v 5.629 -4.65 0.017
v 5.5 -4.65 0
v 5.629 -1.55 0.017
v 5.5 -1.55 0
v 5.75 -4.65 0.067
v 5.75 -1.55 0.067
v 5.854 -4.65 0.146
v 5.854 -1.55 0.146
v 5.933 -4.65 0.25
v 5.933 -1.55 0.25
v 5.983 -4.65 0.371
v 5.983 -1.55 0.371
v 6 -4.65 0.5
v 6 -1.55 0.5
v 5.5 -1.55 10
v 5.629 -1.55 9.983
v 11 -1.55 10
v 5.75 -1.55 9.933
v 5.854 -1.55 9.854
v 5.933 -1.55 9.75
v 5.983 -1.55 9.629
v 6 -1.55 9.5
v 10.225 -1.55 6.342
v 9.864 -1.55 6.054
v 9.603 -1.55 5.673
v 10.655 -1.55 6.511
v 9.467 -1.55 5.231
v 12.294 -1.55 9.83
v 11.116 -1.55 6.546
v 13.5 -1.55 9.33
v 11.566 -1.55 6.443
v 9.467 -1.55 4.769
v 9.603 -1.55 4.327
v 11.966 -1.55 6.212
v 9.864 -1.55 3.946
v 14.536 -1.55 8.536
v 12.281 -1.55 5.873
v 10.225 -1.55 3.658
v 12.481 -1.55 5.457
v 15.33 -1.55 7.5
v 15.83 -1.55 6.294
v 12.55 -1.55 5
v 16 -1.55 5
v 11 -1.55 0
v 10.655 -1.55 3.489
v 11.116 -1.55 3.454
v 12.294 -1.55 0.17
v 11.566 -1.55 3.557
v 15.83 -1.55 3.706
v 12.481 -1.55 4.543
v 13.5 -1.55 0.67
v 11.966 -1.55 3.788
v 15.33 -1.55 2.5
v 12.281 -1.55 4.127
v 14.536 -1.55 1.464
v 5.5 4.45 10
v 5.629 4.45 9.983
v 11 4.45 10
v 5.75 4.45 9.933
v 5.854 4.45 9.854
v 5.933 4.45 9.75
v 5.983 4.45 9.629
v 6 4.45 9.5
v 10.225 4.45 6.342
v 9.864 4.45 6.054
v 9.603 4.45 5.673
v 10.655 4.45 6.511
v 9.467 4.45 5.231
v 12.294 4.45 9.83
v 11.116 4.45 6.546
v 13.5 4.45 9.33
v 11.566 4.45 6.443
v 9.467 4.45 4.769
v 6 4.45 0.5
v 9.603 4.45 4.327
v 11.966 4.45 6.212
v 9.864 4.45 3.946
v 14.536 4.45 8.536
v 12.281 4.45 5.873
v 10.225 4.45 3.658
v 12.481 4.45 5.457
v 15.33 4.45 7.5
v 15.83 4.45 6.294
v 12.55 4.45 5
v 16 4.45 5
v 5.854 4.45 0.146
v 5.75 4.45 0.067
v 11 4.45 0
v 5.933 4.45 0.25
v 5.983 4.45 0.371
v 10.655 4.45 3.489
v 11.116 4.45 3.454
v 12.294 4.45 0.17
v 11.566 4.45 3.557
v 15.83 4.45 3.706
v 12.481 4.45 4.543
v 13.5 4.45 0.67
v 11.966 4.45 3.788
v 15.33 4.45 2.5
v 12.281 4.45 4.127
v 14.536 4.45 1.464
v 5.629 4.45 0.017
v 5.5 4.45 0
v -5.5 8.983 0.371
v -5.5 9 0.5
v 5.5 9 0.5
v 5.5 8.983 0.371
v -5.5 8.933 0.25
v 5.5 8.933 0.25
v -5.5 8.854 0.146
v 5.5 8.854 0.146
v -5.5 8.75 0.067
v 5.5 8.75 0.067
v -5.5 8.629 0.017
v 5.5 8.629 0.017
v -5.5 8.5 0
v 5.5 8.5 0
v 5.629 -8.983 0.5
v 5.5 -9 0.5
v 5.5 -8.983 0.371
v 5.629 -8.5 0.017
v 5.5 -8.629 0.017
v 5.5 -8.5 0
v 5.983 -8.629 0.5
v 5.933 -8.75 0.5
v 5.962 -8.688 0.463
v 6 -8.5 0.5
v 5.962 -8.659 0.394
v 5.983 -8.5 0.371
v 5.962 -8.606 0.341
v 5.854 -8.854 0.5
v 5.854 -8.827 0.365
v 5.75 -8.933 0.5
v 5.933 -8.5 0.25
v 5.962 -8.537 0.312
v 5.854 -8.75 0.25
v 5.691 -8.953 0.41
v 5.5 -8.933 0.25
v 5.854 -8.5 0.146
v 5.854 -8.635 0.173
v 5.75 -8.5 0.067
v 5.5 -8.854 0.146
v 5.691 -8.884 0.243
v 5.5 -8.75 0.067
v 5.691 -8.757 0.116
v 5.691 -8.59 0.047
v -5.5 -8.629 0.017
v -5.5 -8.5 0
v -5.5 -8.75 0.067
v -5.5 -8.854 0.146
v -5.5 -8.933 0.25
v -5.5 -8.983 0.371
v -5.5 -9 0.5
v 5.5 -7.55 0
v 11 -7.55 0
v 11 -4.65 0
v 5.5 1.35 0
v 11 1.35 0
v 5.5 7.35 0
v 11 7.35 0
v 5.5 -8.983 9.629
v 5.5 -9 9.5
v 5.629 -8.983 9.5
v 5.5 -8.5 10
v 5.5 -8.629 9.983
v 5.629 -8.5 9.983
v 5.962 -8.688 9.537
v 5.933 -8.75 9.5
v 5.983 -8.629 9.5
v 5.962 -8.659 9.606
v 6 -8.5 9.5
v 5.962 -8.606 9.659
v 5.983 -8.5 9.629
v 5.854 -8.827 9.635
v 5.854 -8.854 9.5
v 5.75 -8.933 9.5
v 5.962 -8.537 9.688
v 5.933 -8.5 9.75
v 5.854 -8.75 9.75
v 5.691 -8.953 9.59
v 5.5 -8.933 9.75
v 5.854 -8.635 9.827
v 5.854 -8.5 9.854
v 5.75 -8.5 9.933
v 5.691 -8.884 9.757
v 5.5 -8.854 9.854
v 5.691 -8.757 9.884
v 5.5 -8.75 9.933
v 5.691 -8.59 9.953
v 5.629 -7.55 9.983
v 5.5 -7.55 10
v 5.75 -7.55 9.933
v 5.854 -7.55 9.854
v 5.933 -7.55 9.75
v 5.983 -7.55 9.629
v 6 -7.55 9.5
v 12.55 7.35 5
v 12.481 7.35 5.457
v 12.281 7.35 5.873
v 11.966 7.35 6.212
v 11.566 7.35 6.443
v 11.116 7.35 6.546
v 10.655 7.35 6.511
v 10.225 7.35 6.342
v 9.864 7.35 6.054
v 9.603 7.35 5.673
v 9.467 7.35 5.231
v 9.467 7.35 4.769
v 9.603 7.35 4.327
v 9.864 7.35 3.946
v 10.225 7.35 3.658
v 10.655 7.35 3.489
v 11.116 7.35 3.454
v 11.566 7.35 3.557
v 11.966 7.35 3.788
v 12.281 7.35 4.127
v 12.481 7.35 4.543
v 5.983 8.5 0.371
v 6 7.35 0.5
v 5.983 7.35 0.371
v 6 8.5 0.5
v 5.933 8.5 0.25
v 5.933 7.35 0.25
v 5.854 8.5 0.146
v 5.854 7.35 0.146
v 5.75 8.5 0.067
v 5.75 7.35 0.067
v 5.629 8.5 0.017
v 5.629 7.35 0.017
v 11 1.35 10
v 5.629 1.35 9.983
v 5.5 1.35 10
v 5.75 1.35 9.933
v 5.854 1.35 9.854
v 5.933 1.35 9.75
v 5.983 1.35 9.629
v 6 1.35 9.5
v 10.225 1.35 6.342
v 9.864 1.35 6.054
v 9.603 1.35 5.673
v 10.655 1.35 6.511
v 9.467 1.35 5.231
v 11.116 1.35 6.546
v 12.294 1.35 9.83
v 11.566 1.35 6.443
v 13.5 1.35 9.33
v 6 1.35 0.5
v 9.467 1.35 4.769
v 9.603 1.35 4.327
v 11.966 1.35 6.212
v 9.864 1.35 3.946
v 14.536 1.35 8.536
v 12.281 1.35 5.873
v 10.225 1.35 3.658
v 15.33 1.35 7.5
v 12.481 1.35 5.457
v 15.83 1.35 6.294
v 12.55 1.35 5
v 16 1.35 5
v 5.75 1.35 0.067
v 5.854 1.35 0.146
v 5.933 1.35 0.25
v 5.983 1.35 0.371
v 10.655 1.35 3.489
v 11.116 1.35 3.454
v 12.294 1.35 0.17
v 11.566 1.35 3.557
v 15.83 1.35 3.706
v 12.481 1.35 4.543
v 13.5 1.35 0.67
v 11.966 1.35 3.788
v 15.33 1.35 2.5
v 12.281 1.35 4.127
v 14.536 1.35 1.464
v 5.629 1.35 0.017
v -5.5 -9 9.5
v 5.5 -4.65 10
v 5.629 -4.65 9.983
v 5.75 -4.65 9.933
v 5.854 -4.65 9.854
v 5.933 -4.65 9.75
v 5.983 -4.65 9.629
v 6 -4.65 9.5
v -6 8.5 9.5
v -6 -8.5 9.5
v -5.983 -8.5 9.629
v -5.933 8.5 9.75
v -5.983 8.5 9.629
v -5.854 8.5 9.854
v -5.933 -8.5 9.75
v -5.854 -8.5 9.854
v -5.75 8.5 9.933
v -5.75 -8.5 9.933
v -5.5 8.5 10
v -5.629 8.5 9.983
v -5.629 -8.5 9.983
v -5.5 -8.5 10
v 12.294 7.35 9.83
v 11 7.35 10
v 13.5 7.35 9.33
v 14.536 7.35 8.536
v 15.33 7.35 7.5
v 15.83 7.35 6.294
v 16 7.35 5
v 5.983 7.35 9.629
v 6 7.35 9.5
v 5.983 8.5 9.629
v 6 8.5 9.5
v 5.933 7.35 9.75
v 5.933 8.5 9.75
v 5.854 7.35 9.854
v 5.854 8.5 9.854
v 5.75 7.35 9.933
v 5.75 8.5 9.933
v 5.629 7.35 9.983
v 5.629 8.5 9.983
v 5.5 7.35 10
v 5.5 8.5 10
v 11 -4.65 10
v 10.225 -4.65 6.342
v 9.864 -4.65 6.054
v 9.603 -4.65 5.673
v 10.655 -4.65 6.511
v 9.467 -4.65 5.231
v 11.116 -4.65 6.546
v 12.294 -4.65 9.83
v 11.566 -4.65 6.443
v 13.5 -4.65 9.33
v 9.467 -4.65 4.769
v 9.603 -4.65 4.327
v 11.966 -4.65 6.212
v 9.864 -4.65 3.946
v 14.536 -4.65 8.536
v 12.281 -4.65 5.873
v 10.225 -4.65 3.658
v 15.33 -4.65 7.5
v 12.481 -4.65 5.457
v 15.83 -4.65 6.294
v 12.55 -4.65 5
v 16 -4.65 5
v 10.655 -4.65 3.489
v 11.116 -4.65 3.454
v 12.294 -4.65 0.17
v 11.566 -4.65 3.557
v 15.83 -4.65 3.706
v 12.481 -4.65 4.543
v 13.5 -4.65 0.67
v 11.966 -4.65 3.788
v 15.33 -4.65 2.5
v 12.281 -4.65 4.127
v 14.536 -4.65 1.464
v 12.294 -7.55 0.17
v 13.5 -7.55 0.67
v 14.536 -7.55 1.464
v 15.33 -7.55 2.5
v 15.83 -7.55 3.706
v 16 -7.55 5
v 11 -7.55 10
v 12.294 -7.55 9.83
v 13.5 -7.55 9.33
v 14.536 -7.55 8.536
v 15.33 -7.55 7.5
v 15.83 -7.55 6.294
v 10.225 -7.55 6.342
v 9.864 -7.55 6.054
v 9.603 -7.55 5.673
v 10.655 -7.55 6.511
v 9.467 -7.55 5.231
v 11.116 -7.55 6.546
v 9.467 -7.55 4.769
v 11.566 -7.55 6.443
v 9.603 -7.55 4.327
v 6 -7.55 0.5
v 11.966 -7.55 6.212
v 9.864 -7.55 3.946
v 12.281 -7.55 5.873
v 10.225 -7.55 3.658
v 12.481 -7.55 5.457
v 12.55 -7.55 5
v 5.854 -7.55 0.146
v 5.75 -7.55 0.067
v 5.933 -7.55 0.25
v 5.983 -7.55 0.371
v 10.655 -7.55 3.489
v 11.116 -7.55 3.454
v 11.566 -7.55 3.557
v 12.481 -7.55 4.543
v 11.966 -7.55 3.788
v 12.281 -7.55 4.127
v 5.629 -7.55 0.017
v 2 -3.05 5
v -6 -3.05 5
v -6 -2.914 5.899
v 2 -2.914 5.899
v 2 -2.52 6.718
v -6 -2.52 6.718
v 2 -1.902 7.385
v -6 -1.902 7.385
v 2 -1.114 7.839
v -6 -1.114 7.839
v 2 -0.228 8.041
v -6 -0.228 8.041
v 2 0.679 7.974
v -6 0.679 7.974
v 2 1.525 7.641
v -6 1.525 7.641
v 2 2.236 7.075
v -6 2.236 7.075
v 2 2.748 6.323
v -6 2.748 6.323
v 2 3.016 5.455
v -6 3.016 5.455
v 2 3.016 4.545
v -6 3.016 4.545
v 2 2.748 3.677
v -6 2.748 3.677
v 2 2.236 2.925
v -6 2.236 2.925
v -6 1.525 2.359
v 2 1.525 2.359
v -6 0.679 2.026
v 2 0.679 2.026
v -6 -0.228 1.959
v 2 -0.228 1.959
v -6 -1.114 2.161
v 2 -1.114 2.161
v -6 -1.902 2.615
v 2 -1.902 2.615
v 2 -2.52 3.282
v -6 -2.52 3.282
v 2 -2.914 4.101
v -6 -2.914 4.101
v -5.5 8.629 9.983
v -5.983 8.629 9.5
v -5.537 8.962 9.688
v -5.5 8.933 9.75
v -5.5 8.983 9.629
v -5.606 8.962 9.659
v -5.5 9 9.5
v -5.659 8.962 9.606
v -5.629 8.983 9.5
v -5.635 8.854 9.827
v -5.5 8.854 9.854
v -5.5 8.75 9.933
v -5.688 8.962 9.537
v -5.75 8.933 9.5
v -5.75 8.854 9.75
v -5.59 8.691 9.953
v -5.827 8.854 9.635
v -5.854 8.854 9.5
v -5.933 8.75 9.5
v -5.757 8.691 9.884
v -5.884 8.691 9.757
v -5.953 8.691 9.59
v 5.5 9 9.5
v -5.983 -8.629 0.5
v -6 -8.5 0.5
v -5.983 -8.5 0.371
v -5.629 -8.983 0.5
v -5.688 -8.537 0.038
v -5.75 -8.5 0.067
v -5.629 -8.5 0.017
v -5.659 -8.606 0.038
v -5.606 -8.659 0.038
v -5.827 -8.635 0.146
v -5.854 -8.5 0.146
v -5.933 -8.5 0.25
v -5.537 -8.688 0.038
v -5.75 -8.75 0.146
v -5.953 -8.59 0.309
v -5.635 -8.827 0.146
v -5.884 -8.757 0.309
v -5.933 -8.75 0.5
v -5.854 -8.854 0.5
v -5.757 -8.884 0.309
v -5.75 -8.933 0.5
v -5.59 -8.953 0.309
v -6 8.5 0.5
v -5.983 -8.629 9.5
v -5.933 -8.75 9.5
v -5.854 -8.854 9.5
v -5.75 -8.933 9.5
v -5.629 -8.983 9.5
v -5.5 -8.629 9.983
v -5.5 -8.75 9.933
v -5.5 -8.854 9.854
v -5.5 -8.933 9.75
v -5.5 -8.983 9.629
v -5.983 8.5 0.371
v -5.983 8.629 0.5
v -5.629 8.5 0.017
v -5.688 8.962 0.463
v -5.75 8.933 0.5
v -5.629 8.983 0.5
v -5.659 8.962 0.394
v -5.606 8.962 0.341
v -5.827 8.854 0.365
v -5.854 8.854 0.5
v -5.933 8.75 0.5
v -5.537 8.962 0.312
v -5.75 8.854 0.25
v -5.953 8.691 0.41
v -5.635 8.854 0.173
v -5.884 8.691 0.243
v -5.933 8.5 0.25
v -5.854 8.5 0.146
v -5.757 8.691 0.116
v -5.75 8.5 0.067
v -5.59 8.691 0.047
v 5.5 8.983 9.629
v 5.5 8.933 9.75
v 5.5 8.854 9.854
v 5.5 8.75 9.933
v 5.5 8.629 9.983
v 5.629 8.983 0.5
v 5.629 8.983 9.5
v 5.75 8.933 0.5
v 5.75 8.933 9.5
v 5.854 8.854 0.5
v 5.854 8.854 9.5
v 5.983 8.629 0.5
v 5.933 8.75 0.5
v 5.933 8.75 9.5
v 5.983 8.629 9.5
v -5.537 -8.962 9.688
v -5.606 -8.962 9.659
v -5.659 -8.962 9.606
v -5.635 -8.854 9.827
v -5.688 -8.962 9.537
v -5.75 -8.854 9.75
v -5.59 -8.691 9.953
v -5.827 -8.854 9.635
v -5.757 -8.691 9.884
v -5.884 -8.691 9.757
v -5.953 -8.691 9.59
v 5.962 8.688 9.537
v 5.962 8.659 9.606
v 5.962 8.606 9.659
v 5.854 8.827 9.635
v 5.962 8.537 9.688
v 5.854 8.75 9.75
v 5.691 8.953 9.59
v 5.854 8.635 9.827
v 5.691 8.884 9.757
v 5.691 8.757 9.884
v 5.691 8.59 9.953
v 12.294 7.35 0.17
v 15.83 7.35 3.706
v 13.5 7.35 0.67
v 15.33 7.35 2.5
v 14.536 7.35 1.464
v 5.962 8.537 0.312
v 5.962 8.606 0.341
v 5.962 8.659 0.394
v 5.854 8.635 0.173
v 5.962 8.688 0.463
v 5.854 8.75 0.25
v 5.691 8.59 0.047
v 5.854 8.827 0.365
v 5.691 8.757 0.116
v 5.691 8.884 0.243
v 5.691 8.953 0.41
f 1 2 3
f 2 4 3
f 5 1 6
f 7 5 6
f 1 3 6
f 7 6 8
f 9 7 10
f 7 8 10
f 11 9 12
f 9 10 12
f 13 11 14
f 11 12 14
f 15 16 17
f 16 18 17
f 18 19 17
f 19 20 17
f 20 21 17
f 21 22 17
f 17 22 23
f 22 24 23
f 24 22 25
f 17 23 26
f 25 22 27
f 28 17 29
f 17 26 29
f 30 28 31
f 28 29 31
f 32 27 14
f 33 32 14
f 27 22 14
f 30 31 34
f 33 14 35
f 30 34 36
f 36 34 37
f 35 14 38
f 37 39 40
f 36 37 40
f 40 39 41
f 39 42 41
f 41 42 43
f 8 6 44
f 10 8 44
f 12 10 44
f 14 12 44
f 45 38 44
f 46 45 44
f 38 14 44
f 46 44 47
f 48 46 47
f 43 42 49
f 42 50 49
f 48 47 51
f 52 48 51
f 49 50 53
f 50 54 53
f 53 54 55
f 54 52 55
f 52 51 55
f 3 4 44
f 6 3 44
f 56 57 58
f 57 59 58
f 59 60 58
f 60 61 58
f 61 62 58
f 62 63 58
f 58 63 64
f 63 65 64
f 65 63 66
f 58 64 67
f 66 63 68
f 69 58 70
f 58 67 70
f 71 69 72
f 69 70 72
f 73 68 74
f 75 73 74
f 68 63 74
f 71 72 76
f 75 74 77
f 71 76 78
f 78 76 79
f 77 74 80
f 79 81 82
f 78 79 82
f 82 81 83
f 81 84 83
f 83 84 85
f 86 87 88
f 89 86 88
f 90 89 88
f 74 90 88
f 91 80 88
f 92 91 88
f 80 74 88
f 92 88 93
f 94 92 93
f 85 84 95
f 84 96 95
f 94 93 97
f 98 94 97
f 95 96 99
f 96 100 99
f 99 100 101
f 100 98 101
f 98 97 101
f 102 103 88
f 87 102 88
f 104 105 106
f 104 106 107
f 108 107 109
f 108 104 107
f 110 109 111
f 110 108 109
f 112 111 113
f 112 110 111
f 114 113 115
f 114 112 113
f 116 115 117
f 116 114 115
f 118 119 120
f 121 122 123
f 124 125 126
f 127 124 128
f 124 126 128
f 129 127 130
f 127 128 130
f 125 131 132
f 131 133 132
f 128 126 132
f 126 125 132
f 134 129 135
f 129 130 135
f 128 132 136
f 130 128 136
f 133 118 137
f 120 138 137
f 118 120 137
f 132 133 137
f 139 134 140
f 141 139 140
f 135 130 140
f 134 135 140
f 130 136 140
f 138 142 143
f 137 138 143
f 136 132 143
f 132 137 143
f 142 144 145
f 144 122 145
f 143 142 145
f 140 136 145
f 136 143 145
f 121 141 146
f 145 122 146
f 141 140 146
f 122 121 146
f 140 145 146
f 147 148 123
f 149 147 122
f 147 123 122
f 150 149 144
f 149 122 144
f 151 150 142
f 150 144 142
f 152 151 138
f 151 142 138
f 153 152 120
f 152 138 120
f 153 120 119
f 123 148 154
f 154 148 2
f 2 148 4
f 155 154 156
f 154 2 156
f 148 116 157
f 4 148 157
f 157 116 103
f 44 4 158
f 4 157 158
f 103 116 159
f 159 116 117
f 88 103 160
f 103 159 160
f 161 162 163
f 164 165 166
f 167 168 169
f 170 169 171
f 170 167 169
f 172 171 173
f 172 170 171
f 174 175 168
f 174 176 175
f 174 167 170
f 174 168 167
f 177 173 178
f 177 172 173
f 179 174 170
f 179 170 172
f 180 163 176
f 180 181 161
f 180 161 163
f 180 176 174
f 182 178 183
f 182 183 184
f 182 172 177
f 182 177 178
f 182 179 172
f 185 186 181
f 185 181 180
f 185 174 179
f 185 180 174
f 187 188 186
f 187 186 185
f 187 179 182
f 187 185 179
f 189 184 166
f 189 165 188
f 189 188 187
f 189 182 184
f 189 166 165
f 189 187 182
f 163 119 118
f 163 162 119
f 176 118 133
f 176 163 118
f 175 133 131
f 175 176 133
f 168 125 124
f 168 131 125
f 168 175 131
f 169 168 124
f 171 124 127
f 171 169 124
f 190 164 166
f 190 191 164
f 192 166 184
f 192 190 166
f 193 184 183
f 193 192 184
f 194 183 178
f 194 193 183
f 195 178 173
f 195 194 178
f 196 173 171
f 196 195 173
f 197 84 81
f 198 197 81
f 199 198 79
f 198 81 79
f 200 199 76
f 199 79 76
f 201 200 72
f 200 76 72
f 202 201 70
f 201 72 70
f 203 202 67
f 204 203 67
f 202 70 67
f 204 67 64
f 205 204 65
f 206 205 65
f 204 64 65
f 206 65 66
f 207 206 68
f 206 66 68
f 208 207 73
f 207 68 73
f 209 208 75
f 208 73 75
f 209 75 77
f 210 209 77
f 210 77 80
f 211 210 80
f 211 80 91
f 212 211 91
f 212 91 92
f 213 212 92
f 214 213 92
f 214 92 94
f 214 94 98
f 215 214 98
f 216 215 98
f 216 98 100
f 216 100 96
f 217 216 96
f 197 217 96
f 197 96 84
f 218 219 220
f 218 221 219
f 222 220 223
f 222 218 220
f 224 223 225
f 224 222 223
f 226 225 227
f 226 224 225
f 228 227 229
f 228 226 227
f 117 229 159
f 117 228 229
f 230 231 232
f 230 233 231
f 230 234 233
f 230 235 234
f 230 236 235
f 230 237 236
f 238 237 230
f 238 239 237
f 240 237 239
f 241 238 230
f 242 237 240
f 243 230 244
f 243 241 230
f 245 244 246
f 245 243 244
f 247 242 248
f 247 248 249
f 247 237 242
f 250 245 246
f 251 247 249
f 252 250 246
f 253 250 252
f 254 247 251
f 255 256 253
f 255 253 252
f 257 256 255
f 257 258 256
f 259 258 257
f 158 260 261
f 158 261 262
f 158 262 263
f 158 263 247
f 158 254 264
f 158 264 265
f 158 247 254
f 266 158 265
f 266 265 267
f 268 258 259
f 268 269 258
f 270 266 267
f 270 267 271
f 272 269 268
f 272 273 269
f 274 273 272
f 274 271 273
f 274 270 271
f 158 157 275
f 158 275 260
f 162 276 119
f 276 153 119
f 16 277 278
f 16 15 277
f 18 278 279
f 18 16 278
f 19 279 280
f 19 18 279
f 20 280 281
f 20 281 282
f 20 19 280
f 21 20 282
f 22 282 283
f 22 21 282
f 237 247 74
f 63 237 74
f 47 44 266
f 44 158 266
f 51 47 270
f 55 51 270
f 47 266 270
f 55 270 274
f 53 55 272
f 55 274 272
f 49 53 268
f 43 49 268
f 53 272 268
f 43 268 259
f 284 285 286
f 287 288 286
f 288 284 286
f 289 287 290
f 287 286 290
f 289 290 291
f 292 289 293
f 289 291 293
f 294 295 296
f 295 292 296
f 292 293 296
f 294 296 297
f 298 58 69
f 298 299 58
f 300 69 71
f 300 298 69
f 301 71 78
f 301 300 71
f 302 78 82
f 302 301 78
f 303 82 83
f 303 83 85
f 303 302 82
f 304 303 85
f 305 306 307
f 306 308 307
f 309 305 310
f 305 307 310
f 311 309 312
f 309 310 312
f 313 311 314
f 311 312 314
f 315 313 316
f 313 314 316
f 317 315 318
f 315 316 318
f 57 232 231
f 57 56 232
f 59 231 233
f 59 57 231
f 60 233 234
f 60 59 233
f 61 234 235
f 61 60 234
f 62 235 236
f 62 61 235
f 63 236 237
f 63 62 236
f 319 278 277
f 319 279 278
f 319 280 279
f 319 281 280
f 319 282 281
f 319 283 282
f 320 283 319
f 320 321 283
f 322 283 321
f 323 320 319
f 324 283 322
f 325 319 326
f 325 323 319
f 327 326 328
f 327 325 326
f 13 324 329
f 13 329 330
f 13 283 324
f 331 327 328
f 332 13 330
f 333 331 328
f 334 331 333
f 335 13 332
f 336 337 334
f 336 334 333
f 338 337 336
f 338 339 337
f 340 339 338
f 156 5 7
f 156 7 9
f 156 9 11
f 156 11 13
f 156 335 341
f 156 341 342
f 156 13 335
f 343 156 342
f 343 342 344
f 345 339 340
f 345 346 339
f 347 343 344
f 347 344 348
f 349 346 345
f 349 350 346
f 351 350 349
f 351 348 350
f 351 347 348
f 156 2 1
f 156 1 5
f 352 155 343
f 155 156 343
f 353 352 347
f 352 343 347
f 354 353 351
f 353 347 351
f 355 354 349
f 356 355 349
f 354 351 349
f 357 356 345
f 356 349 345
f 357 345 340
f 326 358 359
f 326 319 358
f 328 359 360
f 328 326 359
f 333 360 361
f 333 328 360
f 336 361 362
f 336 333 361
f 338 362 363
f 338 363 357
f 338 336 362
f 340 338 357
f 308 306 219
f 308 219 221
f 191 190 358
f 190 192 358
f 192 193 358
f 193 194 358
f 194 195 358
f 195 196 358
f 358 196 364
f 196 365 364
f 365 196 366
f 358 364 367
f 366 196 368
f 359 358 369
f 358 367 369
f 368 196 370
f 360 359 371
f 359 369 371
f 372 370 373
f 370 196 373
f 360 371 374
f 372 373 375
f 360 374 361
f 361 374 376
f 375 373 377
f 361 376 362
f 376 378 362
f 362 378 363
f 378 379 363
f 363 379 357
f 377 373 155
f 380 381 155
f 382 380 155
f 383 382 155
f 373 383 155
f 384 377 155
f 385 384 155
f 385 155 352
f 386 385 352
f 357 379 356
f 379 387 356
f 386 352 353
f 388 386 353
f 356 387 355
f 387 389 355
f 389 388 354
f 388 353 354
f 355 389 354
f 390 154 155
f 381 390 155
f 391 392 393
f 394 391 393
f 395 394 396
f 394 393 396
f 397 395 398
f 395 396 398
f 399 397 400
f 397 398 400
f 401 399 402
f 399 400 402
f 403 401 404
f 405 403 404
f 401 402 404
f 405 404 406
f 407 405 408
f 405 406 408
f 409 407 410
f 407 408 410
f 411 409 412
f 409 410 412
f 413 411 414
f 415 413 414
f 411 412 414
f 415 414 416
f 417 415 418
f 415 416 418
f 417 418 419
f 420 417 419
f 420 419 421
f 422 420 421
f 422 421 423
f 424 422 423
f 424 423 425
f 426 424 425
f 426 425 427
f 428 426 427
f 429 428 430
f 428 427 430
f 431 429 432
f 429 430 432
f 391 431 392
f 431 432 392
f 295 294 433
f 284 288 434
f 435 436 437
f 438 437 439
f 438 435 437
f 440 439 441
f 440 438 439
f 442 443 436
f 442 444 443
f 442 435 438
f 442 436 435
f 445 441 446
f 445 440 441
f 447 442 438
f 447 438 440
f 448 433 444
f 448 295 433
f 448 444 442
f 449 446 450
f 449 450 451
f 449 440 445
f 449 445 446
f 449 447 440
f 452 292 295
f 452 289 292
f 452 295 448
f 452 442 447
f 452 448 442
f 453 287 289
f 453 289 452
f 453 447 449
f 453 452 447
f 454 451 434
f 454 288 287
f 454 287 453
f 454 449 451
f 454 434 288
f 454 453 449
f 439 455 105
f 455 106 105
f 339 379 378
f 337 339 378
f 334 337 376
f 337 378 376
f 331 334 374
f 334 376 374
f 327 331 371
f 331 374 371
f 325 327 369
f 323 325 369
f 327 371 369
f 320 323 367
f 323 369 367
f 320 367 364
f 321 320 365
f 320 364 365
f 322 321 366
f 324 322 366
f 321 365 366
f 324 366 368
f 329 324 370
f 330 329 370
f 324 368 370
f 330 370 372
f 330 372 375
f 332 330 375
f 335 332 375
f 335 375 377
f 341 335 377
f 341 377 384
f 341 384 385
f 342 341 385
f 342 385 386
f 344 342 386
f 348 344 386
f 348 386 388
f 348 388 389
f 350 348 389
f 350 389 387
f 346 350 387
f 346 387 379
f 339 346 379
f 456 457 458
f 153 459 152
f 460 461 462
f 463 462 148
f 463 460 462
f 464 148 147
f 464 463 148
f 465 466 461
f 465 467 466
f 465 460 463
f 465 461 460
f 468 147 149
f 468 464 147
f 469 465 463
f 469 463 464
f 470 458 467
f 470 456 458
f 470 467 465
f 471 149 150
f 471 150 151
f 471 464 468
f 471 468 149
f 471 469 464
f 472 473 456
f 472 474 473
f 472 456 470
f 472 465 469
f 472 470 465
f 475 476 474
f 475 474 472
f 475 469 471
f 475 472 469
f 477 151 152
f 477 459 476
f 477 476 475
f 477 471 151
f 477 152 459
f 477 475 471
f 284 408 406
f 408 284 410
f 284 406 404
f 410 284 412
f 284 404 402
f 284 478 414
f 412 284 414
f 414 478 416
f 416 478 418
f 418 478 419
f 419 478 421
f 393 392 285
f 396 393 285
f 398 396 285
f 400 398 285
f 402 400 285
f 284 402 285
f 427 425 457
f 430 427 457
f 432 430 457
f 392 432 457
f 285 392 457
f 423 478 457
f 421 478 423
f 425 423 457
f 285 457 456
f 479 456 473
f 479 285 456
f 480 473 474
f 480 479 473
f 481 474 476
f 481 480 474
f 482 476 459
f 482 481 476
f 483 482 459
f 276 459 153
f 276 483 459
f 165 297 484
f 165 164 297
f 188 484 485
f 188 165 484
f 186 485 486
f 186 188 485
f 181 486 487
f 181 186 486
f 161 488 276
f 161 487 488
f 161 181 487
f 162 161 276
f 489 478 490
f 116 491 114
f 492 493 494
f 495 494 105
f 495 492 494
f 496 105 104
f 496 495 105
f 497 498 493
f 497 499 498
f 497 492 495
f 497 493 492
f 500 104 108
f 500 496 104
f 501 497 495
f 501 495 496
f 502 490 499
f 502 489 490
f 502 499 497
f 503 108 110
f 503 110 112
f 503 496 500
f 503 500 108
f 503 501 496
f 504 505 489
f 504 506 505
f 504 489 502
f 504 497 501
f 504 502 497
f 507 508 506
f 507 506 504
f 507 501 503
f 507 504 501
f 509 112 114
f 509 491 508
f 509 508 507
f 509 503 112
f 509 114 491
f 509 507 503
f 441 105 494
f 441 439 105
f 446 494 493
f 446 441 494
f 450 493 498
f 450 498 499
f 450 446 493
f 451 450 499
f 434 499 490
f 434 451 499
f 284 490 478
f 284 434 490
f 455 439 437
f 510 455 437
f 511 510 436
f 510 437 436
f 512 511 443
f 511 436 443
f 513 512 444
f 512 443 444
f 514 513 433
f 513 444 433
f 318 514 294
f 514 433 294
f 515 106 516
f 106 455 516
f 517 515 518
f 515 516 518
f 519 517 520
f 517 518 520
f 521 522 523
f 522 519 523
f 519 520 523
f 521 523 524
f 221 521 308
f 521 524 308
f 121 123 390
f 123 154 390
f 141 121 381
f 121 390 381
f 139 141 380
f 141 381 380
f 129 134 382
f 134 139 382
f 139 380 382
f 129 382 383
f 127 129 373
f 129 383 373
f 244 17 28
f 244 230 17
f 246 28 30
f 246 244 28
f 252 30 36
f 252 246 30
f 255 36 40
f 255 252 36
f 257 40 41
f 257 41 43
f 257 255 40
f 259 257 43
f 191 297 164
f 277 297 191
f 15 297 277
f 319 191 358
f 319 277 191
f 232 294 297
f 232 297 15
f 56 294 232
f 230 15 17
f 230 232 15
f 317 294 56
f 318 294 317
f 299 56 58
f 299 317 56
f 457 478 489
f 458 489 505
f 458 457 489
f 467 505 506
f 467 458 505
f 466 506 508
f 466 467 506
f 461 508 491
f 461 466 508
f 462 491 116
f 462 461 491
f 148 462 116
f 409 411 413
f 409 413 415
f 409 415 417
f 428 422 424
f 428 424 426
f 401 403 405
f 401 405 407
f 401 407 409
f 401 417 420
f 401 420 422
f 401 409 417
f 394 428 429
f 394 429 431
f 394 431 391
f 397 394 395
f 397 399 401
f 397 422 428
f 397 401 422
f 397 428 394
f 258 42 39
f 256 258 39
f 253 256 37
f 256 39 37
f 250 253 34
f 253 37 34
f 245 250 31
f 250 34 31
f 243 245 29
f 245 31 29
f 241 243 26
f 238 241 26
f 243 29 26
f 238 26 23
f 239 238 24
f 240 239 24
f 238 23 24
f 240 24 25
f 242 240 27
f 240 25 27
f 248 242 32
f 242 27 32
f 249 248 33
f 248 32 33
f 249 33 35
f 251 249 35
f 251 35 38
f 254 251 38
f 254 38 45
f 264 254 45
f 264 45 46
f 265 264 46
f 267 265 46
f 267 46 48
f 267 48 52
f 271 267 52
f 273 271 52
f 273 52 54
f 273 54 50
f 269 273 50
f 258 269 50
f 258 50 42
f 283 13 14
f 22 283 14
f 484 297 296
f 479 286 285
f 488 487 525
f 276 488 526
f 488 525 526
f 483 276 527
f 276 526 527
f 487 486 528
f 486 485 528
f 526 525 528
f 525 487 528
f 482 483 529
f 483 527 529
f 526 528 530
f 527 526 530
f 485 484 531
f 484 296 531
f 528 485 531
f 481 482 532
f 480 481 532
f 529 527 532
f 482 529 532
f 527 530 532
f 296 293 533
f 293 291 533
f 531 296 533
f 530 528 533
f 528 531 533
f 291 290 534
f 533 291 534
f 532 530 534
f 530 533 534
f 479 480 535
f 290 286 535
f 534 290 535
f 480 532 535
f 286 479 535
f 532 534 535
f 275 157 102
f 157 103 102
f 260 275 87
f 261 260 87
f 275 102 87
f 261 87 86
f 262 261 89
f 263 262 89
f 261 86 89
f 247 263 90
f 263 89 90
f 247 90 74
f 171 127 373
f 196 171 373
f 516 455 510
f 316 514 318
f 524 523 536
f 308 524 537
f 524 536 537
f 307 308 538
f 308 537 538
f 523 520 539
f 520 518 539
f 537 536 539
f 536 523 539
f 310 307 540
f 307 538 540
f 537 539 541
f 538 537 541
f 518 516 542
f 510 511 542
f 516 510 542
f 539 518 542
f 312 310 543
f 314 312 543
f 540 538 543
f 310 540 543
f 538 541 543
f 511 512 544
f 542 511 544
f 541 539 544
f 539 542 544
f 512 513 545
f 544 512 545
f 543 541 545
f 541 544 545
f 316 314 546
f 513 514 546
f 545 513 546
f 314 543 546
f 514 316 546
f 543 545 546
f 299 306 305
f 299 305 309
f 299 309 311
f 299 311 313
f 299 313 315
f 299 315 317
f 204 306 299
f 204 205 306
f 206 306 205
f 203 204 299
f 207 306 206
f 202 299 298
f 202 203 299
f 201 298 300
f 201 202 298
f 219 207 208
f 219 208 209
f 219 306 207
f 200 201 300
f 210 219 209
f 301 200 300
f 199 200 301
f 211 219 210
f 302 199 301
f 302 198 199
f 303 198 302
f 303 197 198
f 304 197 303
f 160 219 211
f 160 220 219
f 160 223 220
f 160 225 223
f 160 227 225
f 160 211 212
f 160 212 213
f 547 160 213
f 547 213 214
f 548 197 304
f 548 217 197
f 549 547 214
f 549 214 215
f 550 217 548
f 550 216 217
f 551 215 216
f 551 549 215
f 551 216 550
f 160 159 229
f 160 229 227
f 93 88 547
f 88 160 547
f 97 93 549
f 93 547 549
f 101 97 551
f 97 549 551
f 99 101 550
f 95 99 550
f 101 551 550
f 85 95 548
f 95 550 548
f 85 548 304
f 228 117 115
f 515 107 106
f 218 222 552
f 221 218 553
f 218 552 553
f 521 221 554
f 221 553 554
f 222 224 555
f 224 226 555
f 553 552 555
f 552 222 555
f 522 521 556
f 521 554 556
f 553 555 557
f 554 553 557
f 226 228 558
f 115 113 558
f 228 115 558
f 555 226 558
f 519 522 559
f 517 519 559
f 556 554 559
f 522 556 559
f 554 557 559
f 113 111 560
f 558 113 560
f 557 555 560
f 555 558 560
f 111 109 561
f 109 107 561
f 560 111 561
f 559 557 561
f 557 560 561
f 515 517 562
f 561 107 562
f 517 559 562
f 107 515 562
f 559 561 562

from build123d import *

# Parameters (mm, degrees)
F0_W     = 10
F0_H     = 2.9
F1_DEPTH = 10
F2_R     = 3.05
F3_DEPTH = 8
F4_R     = 1.55
F5_DEPTH = 25
F6_R     = 0.5
F7_R     = 4.99999


# Not quite as in the source:
# - a fillet or chamfer is up to 0.001 mm smaller than in the source, because OpenCascade refuses the exact size


with BuildPart() as f1:
    # F0 (on Top) → F1 (new body)
    with BuildSketch(Plane.XY):
        Polygon((6, 9), (-6, 9), (-6, -9), (6, -9), (6, -7.55), (6, -4.65), (6, -1.55), (6, 1.35), (6, 4.45), (6, 7.35), align=None)
        with Locations((11, 5.9)):
            Rectangle(F0_W, F0_H)
        with Locations((11, -0.1)):
            Rectangle(F0_W, F0_H)
        with Locations((11, -6.1)):
            Rectangle(F0_W, F0_H)
    extrude(amount=F1_DEPTH)

    # F2 (on face) → F3 (cut)
    with BuildSketch(Plane(origin=(-6, 0, 0), x_dir=(0, -1, 0), z_dir=(-1, 0, 0))):
        with Locations((0, 5)):
            Circle(F2_R)
    extrude(amount=-F3_DEPTH, mode=Mode.SUBTRACT)

    # F4 (on face) → F5 (cut)
    with BuildSketch(Plane.XZ.offset(7.55)):
        with Locations((11, 5)):
            Circle(F4_R)
    extrude(amount=-F5_DEPTH, mode=Mode.SUBTRACT)

    # F6
    f6_edges = [f1.edges().sort_by_distance(p)[0] for p in [
        (-6, 0, 10),
        (0, -9, 10),
        (0, 9, 10),
        (-6, -9, 5),
        (-6, 0, 0),
        (-6, 9, 5),
        (0, 9, 0),
        (0, -9, 0),
        (6, -9, 5),
        (6, -8.275, 0),
        (6, -3.1, 0),
        (6, 2.9, 0),
        (6, 8.175, 0),
        (6, 9, 5),
        (6, 8.175, 10),
        (6, 2.9, 10),
        (6, -3.1, 10),
        (6, -8.275, 10),
    ]]
    fillet(f6_edges, radius=F6_R)

    # F7 (radius 5 in the source; OpenCascade refuses exactly that, so slightly less here)
    f7_edges = [f1.edges().sort_by_distance(p)[0] for p in [
        (16, 5.9, 0),
        (16, 5.9, 10),
        (16, -0.1, 10),
        (16, -0.1, 0),
        (16, -6.1, 0),
        (16, -6.1, 10),
    ]]
    fillet(f7_edges, radius=F7_R)


solid = f1.part
